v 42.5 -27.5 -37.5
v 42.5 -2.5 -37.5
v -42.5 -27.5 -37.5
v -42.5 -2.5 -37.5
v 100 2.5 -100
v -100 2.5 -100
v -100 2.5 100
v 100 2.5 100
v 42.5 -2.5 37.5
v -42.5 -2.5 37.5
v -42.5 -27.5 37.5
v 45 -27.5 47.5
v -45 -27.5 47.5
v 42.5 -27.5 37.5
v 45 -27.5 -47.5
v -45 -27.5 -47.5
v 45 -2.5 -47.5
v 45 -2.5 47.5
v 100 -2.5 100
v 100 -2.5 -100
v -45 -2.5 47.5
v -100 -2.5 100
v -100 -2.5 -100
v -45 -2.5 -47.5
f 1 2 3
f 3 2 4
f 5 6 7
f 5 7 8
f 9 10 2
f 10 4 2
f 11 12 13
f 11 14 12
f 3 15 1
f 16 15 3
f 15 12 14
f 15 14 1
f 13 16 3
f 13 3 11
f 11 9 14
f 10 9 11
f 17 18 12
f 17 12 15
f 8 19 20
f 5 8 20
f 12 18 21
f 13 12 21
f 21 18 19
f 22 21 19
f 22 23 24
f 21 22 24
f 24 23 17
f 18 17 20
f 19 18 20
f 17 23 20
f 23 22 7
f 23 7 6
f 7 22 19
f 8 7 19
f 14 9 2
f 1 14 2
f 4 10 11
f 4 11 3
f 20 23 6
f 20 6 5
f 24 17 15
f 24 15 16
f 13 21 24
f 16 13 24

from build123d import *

# Parameters (mm, degrees)
BASE_DEPTH          = 2.5
BASE_DEPTH_BACK     = 2.5
SKETCH1_W           = 200
SKETCH1_H           = 200
SKETCH2_W           = 90
SKETCH2_H           = 95
SKETCH2_W_2         = 85
SKETCH2_H_2         = 75
BATTERYHOLDER_DEPTH = 25


with BuildPart() as part:
    # Sketch1 → Base (new, two sides: drawn at the far end of the back side and taken through both)
    with BuildSketch(Plane(origin=(0, 0, 0), x_dir=(1, 0, 0), z_dir=(0, 1, 0)).offset(-BASE_DEPTH_BACK)):
        Rectangle(SKETCH1_W, SKETCH1_H)
    extrude(amount=BASE_DEPTH + BASE_DEPTH_BACK)

    # Sketch2 → BatteryHolder (add)
    with BuildSketch(Plane(origin=(0, -2.5, 0), x_dir=(-1, 0, 0), z_dir=(0, -1, 0))):
        Rectangle(SKETCH2_W, SKETCH2_H)
        Rectangle(SKETCH2_W_2, SKETCH2_H_2, mode=Mode.SUBTRACT)
    extrude(amount=BATTERYHOLDER_DEPTH)


solid = part.part
